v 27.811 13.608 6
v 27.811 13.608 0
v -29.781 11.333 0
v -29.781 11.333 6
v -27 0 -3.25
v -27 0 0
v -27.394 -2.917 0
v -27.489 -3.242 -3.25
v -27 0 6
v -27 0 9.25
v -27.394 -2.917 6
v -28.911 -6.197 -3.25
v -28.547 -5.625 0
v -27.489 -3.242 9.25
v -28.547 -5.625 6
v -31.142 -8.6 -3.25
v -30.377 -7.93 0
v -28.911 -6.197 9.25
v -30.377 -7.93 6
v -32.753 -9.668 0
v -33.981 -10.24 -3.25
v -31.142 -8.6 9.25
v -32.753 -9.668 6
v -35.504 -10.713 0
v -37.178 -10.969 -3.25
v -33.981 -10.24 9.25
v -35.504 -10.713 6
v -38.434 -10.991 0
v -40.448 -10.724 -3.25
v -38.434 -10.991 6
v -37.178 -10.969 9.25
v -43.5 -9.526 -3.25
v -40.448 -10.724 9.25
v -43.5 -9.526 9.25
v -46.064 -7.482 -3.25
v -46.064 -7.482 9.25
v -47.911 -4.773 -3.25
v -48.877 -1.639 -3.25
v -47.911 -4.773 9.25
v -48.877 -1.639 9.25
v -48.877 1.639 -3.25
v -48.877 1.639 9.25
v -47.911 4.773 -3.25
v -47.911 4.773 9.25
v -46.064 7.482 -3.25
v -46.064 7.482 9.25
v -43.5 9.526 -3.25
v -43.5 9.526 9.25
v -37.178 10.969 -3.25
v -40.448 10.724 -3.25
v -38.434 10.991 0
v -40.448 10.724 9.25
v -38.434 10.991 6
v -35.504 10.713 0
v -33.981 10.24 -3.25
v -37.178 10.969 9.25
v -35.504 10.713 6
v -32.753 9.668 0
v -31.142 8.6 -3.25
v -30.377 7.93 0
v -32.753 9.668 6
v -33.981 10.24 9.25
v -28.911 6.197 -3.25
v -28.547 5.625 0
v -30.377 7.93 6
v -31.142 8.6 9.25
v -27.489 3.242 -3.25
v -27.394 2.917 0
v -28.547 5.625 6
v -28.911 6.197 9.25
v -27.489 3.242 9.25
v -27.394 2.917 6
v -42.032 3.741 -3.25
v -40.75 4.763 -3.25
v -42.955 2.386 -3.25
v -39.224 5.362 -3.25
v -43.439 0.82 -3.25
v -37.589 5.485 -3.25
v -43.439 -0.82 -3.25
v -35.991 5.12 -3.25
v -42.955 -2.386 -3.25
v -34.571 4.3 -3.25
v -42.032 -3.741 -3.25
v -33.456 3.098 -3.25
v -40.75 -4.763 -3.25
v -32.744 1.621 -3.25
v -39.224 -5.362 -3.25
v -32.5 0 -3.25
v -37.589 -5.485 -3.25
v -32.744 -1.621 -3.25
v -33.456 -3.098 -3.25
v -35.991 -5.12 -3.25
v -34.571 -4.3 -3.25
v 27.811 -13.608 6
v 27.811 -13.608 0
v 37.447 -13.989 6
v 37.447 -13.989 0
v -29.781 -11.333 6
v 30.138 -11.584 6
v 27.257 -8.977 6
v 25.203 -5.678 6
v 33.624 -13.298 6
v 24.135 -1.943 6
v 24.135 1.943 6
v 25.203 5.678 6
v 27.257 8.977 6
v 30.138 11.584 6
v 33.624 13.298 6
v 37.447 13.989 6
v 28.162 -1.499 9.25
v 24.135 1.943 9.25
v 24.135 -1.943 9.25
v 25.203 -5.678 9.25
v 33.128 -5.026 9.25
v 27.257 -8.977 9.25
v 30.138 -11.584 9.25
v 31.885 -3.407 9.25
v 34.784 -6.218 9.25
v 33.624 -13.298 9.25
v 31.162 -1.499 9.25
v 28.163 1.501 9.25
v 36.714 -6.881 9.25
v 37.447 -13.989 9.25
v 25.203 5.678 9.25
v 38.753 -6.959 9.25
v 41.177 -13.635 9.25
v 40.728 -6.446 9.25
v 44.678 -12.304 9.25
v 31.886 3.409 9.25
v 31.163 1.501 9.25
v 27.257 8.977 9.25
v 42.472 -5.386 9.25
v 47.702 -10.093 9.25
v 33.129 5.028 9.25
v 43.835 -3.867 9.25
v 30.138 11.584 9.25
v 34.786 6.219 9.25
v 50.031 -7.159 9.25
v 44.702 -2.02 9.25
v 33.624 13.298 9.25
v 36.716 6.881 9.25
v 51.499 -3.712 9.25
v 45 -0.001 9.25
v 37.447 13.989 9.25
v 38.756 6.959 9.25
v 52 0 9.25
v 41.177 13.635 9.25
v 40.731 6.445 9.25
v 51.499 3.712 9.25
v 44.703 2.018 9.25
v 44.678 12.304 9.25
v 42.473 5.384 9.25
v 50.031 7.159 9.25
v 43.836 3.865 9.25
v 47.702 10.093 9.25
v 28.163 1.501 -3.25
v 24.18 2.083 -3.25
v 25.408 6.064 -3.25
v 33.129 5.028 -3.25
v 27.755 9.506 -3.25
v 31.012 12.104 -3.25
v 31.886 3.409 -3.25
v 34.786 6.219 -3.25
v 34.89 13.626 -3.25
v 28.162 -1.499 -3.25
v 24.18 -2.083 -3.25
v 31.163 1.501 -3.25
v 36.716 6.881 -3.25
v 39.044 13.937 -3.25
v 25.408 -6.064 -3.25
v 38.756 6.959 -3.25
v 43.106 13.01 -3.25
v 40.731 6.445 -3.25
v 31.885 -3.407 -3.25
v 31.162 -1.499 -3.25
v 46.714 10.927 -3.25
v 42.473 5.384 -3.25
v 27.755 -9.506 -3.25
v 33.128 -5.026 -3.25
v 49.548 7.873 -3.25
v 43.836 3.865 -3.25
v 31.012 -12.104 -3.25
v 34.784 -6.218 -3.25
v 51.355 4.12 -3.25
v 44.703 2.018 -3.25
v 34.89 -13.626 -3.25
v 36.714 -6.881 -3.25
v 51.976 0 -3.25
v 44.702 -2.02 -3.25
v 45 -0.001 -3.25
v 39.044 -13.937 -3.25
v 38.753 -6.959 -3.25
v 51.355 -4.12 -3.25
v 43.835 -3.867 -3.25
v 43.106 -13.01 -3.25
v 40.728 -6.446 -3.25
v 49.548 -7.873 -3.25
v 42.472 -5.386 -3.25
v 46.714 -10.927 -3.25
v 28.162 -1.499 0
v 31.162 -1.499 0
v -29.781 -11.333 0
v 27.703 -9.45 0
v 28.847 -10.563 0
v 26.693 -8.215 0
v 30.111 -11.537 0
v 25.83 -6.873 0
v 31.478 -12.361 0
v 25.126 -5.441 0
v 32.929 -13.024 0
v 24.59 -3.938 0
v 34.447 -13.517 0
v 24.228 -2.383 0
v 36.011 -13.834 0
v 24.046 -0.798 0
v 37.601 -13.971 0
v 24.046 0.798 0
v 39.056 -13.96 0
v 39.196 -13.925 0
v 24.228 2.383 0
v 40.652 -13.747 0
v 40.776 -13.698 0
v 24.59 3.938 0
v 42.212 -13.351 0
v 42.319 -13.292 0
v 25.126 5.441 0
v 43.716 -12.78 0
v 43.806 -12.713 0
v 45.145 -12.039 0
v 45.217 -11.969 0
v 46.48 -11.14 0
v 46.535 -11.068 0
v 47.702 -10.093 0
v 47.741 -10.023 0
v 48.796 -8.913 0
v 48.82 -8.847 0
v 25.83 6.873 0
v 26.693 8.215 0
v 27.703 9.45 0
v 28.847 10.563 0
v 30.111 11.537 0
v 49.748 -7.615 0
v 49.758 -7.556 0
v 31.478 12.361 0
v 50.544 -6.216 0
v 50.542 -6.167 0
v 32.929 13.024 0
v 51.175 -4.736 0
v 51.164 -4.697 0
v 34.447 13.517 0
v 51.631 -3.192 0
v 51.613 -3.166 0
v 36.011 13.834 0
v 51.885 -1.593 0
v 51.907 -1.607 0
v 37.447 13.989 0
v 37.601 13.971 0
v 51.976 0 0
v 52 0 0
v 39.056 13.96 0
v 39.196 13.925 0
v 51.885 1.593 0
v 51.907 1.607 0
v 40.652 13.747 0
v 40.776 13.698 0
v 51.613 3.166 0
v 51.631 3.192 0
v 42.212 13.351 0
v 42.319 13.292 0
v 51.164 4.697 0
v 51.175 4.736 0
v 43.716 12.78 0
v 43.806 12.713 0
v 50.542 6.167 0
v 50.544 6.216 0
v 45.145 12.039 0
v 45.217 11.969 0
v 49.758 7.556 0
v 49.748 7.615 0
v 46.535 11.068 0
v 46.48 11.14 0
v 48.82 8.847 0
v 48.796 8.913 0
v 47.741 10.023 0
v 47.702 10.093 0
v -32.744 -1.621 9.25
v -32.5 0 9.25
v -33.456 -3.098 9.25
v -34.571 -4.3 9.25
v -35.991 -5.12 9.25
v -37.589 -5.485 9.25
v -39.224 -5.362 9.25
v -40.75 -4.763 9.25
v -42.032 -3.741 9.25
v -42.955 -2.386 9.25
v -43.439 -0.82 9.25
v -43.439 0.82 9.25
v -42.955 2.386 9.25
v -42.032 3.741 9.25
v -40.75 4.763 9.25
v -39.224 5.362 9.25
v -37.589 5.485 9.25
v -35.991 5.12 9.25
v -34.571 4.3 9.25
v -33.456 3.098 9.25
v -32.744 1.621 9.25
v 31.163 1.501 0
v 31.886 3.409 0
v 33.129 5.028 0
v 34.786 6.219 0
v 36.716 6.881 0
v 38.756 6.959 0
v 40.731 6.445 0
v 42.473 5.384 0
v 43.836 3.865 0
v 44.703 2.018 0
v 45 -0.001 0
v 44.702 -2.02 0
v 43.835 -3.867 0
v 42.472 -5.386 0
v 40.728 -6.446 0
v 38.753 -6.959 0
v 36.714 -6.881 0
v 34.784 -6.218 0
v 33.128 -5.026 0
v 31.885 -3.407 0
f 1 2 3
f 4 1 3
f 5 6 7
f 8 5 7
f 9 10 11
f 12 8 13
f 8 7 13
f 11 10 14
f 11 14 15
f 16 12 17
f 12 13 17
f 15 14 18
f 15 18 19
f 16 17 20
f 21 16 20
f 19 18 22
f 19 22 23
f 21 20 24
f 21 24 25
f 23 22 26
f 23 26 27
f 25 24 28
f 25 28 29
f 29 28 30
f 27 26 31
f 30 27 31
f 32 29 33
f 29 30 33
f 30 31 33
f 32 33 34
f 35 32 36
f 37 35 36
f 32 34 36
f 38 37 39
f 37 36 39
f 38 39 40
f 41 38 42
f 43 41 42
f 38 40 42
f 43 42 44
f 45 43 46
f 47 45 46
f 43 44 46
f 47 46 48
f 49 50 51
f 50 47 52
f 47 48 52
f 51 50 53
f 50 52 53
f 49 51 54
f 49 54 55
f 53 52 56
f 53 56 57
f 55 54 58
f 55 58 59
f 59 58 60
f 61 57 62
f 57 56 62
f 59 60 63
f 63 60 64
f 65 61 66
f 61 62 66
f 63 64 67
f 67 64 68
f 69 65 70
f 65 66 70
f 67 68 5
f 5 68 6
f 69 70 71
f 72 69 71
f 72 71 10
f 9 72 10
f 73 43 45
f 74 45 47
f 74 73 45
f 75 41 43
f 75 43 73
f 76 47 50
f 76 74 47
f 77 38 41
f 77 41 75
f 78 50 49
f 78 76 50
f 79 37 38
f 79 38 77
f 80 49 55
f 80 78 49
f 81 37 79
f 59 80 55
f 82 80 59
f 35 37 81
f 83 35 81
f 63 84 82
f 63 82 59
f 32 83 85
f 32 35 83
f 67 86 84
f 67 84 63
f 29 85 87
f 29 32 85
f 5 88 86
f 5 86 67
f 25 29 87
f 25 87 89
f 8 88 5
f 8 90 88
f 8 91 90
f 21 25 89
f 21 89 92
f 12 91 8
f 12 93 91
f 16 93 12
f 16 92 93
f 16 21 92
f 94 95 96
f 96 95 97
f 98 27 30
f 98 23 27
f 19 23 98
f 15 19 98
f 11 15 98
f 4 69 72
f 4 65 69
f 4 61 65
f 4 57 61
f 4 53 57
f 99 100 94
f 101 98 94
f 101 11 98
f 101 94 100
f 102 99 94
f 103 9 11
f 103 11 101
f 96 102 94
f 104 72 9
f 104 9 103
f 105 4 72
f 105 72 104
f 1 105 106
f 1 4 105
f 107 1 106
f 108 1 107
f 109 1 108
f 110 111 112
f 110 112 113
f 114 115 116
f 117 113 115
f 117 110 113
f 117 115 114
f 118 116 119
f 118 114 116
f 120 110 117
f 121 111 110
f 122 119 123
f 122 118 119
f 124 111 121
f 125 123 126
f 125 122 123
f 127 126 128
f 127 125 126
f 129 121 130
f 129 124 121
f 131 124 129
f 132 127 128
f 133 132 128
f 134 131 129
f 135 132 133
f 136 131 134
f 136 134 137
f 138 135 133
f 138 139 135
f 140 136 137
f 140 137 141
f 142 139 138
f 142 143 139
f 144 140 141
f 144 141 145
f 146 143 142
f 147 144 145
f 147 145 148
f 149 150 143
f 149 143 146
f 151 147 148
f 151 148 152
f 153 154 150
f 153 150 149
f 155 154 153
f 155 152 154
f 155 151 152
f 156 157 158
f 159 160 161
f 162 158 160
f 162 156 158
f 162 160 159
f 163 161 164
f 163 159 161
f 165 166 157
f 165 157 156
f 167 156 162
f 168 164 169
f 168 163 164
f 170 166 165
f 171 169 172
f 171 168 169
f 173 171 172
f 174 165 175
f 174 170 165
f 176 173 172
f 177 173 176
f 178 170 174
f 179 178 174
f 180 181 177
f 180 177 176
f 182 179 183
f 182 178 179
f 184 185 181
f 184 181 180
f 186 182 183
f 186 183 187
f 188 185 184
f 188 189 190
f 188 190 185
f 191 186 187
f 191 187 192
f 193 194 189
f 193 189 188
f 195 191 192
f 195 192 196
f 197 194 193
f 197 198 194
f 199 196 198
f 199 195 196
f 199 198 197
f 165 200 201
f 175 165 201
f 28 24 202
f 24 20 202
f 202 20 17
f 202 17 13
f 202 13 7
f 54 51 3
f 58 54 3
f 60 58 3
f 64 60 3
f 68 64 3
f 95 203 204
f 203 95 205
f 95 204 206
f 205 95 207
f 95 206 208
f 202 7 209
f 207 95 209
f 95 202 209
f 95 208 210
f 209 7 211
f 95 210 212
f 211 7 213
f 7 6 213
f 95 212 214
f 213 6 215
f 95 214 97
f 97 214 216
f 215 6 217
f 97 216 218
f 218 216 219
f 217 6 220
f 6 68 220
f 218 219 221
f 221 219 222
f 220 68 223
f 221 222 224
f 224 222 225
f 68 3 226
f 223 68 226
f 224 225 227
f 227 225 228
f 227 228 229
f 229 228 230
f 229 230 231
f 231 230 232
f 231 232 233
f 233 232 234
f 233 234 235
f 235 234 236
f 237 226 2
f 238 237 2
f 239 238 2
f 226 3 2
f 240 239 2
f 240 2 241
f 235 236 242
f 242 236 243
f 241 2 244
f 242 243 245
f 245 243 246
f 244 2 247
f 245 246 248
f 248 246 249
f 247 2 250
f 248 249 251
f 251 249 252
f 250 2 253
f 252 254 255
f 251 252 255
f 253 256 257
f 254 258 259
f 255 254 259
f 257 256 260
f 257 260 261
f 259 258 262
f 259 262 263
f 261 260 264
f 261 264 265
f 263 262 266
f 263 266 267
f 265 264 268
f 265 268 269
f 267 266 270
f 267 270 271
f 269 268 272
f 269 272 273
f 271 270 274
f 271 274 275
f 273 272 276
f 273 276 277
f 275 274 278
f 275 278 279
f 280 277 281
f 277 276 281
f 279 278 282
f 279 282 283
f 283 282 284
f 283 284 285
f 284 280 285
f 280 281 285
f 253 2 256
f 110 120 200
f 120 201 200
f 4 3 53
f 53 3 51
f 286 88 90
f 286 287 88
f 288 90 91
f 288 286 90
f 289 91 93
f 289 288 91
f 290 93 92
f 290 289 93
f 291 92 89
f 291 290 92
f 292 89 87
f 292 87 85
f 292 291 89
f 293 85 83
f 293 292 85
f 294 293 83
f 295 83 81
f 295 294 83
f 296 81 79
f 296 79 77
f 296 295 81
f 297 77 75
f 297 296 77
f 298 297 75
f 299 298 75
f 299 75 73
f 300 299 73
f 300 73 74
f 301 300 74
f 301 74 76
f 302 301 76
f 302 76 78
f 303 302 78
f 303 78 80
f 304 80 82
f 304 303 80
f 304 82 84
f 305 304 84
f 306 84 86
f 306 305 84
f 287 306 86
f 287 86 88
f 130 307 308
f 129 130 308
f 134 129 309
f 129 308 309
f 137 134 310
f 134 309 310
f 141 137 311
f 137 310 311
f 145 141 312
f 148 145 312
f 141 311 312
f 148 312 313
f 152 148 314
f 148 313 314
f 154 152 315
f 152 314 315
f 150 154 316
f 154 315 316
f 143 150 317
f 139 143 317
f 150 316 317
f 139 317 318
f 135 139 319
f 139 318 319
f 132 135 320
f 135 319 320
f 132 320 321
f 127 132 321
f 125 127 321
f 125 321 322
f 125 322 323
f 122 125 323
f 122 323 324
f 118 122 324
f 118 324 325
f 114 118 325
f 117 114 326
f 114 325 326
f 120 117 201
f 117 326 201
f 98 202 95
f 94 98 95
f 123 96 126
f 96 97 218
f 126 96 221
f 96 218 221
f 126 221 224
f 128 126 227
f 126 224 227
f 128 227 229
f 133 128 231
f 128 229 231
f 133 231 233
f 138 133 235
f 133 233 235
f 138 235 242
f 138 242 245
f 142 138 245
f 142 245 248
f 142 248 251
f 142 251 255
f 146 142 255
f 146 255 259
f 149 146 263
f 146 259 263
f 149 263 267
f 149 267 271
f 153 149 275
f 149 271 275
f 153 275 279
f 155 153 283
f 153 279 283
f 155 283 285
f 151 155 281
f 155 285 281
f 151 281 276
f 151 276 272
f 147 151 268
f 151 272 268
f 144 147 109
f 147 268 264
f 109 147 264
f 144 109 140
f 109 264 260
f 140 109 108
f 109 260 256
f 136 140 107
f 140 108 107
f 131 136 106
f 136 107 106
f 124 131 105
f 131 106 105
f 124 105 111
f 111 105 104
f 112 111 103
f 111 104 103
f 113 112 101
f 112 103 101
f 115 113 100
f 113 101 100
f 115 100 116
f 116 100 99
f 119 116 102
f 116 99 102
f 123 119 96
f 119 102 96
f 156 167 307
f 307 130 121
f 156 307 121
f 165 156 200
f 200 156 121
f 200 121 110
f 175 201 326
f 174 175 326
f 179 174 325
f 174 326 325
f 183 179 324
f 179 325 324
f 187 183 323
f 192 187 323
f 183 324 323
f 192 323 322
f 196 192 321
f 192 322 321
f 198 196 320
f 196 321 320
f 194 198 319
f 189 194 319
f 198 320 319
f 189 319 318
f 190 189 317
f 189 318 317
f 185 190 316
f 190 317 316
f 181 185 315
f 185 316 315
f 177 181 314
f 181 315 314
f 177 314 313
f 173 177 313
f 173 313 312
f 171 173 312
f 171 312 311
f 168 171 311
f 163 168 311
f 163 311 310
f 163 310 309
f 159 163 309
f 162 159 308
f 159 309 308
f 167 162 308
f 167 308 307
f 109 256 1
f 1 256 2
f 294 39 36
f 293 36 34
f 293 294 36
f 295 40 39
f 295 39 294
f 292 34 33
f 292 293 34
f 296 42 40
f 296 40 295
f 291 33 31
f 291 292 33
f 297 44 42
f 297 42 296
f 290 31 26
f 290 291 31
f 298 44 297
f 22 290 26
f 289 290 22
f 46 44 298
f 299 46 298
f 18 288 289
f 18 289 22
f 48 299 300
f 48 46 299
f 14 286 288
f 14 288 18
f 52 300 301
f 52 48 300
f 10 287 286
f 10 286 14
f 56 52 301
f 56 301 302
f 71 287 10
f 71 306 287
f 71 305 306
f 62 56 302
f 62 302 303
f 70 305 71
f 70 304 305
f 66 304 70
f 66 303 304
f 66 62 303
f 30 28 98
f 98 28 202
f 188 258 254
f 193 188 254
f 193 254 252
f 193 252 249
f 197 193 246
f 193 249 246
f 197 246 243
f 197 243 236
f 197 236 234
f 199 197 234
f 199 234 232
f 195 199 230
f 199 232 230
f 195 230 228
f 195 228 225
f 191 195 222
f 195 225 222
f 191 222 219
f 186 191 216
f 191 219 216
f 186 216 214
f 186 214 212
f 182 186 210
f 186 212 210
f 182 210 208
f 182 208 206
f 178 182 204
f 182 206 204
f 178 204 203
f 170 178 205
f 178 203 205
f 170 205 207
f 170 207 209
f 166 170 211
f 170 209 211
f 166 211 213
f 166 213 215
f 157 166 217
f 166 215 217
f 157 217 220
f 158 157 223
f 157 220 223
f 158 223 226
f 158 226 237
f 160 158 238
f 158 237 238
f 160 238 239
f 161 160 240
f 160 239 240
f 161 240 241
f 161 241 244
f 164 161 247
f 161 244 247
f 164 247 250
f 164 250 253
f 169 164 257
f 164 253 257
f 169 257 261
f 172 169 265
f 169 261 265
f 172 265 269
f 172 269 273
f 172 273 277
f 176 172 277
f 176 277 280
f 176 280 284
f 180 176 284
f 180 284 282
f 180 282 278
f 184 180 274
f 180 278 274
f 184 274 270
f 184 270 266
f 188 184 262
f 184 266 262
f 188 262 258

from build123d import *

# Parameters (mm, degrees)
F0_R     = 5.5
F1_DEPTH = 6
F4_DEPTH = 3.25
F2_R     = 13.9763796755
F5_DEPTH = 3.25
F3_R     = 5.5
F6_DEPTH = 3.25
F7_R     = 5.5
F8_DEPTH = 3.25


with BuildPart() as f1:
    # F0 (on Top) → F1 (new body)
    with BuildSketch(Plane.XY):
        with BuildLine():
            ThreePointArc((27.8112338211, -13.6084181209), (21, 0), (27.8112338211, 13.6084181209))
            Line((27.8112338211, 13.6084181209), (-29.7807062004, 11.3332788475))
            ThreePointArc((-29.7807062004, 11.3332788475), (-24, 0), (-29.7807062004, -11.3332788475))
            Line((-29.7807062004, -11.3332788475), (27.8112338211, -13.6084181209))
        make_face()
        with BuildLine():
            ThreePointArc((-29.7807062004, -11.3332788475), (-24, 0), (-29.7807062004, 11.3332788475))
            Line((-29.7807062004, 11.3332788475), (-38.4342105263, 10.9914267144))
            ThreePointArc((-38.4342105263, 10.9914267144), (-30.3768876366, 7.9302054131), (-27, 0))
            ThreePointArc((-27, 0), (-30.3768876366, -7.9302054131), (-38.4342105263, -10.9914267144))
            Line((-38.4342105263, -10.9914267144), (-29.7807062004, -11.3332788475))
        make_face()
        with BuildLine():
            ThreePointArc((-27, 0), (-30.3768876366, 7.9302054131), (-38.4342105263, 10.9914267144))
            ThreePointArc((-38.4342105263, 10.9914267144), (-49, 0), (-38.4342105263, -10.9914267144))
            ThreePointArc((-38.4342105263, -10.9914267144), (-30.3768876366, -7.9302054131), (-27, 0))
        make_face()
        with Locations((-38, 0)):
            Circle(F0_R, mode=Mode.SUBTRACT)
        with BuildLine():
            ThreePointArc((37.4473684211, -13.9890885456), (24, 0), (37.4473684211, 13.9890885456))
            Line((37.4473684211, 13.9890885456), (27.8112338211, 13.6084181209))
            ThreePointArc((27.8112338211, 13.6084181209), (21, 0), (27.8112338211, -13.6084181209))
            Line((27.8112338211, -13.6084181209), (37.4473684211, -13.9890885456))
        make_face()
        with BuildLine():
            ThreePointArc((37.4473684211, -13.9890885456), (47.702143008, -10.0929887076), (52, 0))
            ThreePointArc((52, 0), (47.702143008, 10.0929887076), (37.4473684211, 13.9890885456))
            ThreePointArc((37.4473684211, 13.9890885456), (24, 0), (37.4473684211, -13.9890885456))
        make_face()
        with BuildLine():
            ThreePointArc((31.1628594053, 1.5011690405), (44.9999998977, -0.0011968644), (31.1623464634, -1.4988309156))
            Line((31.1623464634, -1.4988309156), (28.1623464634, -1.4988309156))
            Line((28.1623464634, -1.4988309156), (28.1628594053, 1.5011690405))
            Line((28.1628594053, 1.5011690405), (31.1628594053, 1.5011690405))
        make_face(mode=Mode.SUBTRACT)
    extrude(amount=F1_DEPTH)

    # F3 (on face) → F4 (join)
    with BuildSketch(Plane.XY.offset(6)):
        with BuildLine():
            ThreePointArc((52, 0), (47.702143008, 10.0929887076), (37.4473684211, 13.9890885456))
            ThreePointArc((37.4473684211, 13.9890885456), (24, 0), (37.4473684211, -13.9890885456))
            ThreePointArc((37.4473684211, -13.9890885456), (47.702143008, -10.0929887076), (52, 0))
        make_face()
        with BuildLine():
            Line((31.1623464634, -1.4988309156), (28.1623464634, -1.4988309156))
            Line((28.1623464634, -1.4988309156), (28.1628594053, 1.5011690405))
            Line((28.1628594053, 1.5011690405), (31.1628594053, 1.5011690405))
            ThreePointArc((31.1628594053, 1.5011690405), (44.9999998977, -0.0011968644), (31.1623464634, -1.4988309156))
        make_face(mode=Mode.SUBTRACT)
    extrude(amount=F4_DEPTH)

    # F2 (on face) → F5 (join)
    with BuildSketch(Plane(origin=(0, 0, 0), x_dir=(1, 0, 0), z_dir=(0, 0, -1))):
        with Locations((38, 0)):
            Circle(F2_R)
        with BuildLine():
            Line((28.1623464634, 1.4988309156), (31.1623464634, 1.4988309156))
            ThreePointArc((31.1623464634, 1.4988309156), (44.9999998977, 0.0011968644), (31.1628594053, -1.5011690405))
            Line((31.1628594053, -1.5011690405), (28.1628594053, -1.5011690405))
            Line((28.1628594053, -1.5011690405), (28.1623464634, 1.4988309156))
        make_face(mode=Mode.SUBTRACT)
    extrude(amount=F5_DEPTH)

    # F3 (on face) → F6 (join)
    with BuildSketch(Plane.XY.offset(6)):
        with BuildLine():
            ThreePointArc((-38.4342105263, -10.9914267144), (-30.3768876366, -7.9302054131), (-27, 0))
            ThreePointArc((-27, 0), (-30.3768876366, 7.9302054131), (-38.4342105263, 10.9914267144))
            ThreePointArc((-38.4342105263, 10.9914267144), (-49, 0), (-38.4342105263, -10.9914267144))
        make_face()
        with Locations((-38, 0)):
            Circle(F3_R, mode=Mode.SUBTRACT)
    extrude(amount=F6_DEPTH)

    # F7 (on face) → F8 (join)
    with BuildSketch(Plane(origin=(0, 0, 0), x_dir=(1, 0, 0), z_dir=(0, 0, -1))):
        with BuildLine():
            ThreePointArc((-38.4342105263, -10.9914267144), (-30.3768876366, -7.9302054131), (-27, 0))
            ThreePointArc((-27, 0), (-30.3768876366, 7.9302054131), (-38.4342105263, 10.9914267144))
            ThreePointArc((-38.4342105263, 10.9914267144), (-49, 0), (-38.4342105263, -10.9914267144))
        make_face()
        with Locations((-38, 0)):
            Circle(F7_R, mode=Mode.SUBTRACT)
    extrude(amount=F8_DEPTH)


solid = f1.part
